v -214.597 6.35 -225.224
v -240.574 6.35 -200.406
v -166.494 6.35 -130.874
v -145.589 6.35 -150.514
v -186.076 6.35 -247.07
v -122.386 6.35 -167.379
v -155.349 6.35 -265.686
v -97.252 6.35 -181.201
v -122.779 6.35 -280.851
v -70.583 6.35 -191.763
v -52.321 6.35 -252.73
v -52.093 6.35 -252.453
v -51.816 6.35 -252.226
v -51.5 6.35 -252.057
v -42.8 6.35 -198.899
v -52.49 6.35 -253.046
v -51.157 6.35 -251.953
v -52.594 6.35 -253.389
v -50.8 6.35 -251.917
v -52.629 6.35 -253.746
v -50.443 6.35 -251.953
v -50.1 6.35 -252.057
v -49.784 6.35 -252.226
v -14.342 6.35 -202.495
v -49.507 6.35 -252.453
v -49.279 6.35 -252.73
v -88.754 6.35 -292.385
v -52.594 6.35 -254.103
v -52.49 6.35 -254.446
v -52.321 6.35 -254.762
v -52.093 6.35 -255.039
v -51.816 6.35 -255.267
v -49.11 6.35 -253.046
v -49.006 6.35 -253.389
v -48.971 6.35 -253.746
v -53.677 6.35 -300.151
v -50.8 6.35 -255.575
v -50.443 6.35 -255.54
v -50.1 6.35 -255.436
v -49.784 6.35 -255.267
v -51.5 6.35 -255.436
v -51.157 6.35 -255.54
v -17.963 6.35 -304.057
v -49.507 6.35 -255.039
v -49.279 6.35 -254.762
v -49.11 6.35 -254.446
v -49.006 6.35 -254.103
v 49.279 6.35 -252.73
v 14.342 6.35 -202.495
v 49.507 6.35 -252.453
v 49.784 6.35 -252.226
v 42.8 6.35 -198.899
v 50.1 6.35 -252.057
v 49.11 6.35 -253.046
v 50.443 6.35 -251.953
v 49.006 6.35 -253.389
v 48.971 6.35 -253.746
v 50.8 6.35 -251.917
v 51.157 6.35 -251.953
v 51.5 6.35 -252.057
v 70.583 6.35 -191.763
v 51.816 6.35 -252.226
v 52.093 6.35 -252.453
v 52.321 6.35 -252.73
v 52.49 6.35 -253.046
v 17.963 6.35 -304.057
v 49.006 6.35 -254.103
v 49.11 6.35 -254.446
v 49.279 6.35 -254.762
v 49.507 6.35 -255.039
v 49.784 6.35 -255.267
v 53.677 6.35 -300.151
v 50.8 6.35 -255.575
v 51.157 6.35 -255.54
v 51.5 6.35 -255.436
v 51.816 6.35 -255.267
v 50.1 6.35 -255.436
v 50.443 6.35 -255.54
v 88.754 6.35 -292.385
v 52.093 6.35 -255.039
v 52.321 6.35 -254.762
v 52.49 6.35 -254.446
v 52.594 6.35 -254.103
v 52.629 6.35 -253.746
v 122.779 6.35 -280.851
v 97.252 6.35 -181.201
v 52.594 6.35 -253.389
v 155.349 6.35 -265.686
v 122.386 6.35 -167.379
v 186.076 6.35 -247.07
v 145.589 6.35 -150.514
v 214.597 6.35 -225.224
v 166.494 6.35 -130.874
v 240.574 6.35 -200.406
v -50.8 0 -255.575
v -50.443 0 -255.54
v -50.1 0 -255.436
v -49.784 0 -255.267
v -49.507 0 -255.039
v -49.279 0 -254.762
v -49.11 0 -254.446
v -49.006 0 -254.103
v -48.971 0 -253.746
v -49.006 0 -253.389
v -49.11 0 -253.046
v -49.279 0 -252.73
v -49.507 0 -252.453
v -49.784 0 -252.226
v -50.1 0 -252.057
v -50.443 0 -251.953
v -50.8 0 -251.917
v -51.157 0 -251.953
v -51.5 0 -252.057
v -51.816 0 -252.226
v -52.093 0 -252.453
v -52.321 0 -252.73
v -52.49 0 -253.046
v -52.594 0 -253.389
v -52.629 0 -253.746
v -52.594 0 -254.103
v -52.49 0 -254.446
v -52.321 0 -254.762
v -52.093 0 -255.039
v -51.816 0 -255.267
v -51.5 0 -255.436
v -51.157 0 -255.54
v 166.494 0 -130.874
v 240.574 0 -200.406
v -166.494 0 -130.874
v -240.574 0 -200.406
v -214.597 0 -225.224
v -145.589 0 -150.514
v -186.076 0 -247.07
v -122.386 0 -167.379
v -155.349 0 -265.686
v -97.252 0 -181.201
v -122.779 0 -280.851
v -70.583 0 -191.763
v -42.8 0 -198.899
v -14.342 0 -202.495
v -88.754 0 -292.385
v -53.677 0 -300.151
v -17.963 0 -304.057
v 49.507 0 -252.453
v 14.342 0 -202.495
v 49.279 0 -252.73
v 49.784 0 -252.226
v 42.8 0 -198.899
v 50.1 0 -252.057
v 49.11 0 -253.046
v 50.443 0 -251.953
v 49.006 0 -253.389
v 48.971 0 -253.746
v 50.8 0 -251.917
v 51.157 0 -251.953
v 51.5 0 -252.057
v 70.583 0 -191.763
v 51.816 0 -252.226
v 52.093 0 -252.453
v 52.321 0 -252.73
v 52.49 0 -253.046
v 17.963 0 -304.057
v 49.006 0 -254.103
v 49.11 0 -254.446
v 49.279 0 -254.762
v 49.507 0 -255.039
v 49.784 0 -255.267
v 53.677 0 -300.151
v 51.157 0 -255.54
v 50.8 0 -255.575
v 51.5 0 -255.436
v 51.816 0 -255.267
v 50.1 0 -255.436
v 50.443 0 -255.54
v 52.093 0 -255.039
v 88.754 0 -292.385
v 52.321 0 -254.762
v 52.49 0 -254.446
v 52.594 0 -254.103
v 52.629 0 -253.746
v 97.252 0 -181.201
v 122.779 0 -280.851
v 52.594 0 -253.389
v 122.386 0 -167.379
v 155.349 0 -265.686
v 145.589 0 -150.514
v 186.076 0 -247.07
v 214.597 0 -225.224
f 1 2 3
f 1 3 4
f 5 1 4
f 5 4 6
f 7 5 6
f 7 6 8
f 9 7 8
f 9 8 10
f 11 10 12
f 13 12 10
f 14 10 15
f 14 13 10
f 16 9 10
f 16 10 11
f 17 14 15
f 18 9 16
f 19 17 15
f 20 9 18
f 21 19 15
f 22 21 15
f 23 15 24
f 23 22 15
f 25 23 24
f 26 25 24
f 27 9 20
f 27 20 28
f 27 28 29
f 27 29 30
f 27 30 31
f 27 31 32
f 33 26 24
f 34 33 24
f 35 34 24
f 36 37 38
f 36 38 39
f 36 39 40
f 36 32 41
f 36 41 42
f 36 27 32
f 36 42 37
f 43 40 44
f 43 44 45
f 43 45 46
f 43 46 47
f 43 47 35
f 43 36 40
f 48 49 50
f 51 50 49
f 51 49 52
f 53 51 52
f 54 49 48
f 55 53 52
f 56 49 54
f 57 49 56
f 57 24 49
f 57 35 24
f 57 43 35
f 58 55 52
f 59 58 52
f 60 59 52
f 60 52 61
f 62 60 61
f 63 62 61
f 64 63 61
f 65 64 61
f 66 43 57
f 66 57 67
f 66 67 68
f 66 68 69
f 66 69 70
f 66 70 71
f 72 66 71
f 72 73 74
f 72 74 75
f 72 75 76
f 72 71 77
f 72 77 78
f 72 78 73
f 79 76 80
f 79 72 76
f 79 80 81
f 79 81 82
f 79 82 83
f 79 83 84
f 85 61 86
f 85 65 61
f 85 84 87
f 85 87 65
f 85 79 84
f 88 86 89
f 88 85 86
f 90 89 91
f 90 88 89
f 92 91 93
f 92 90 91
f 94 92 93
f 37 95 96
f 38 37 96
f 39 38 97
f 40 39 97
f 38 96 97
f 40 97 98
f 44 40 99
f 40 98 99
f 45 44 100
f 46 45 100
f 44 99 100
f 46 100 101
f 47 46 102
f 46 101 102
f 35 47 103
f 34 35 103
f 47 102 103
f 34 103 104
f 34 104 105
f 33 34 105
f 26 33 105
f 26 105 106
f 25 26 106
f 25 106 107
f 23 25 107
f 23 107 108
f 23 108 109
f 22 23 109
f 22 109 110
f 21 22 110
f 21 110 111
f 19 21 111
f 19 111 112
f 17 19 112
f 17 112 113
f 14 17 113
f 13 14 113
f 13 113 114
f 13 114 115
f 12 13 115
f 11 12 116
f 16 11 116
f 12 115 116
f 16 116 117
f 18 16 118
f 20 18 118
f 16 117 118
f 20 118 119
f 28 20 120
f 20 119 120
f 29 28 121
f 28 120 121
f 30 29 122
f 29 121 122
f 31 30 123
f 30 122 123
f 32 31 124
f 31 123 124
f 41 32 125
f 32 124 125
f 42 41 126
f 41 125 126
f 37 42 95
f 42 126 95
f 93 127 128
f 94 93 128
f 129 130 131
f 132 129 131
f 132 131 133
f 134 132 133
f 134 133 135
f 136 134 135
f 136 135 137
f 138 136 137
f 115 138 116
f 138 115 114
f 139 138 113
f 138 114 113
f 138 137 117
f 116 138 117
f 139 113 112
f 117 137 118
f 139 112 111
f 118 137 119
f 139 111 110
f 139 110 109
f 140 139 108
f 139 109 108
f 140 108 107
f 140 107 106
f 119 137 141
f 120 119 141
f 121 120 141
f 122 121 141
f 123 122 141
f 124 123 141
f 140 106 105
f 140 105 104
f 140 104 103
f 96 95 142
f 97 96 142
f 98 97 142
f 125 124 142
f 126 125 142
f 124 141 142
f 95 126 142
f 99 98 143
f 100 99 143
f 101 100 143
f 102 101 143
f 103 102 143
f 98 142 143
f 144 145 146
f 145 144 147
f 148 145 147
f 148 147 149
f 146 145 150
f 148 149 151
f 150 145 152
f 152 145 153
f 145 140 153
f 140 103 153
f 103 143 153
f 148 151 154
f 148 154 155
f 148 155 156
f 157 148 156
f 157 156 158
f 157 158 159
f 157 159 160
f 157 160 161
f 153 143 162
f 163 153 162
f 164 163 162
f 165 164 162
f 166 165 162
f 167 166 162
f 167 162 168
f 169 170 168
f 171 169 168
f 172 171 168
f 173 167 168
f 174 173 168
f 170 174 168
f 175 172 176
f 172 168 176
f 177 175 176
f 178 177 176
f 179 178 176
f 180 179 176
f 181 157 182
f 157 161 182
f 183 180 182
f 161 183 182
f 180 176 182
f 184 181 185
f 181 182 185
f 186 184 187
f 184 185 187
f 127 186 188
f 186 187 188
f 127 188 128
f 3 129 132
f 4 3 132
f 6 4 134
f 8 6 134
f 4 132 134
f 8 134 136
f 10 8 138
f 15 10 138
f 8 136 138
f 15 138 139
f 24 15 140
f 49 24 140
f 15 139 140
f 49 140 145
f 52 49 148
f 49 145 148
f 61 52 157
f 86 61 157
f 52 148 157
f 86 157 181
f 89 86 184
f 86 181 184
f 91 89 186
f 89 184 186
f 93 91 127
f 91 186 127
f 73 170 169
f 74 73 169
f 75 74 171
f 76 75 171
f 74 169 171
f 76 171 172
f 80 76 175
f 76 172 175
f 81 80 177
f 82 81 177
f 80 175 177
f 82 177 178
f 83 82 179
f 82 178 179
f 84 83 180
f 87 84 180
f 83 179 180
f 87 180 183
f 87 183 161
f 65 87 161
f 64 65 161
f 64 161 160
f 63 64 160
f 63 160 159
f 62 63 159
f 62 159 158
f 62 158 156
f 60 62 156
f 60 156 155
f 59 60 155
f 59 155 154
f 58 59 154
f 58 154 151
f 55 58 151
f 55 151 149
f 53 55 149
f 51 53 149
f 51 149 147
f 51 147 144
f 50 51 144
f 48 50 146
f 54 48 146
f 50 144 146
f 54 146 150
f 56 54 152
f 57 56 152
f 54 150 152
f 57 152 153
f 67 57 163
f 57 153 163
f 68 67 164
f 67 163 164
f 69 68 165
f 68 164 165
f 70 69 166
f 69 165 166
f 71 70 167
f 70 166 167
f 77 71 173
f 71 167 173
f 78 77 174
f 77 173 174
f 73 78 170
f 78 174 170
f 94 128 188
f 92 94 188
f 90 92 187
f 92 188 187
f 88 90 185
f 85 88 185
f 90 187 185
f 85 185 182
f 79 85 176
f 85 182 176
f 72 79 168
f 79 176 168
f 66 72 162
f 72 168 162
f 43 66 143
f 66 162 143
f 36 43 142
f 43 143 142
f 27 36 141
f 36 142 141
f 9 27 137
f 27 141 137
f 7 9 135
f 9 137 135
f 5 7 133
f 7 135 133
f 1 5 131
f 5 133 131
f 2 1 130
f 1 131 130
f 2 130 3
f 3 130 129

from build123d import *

# Parameters (mm, degrees)
BOSS_EXTRUDE1_DEPTH       = 6.35
F_6_CLEARANCE_HOLE1_D     = 3.6576
F_6_CLEARANCE_HOLE1_DEPTH = 25.4
F_6_CLEARANCE_HOLE1_TIP   = 1.0988539


with BuildPart() as part:
    # Sketch1 → Boss-Extrude1 (new body)
    with BuildSketch(Plane(origin=(0, 0, 0), x_dir=(1, 0, 0), z_dir=(0, 1, 0))):
        with BuildLine():
            Line((166.494481955, 130.873744419), (240.574340444, 200.406))
            ThreePointArc((240.574340444, 200.406), (0, 304.546), (-240.574340444, 200.406))
            Line((-240.574340444, 200.406), (-166.494481955, 130.873744419))
            ThreePointArc((-166.494481955, 130.873744419), (0, 202.946), (166.494481955, 130.873744419))
        make_face()
    extrude(amount=BOSS_EXTRUDE1_DEPTH)

    # #6 Clearance Hole1
    with Locations(Plane(origin=(-50.8, 6.35, -253.746255929), x_dir=(0, 0, 1), z_dir=(0, 1, 0))):
        with Locations((0, 0), (0, 101.6)):
            Hole(F_6_CLEARANCE_HOLE1_D / 2, depth=F_6_CLEARANCE_HOLE1_DEPTH)
            with Locations((0, 0, -(F_6_CLEARANCE_HOLE1_DEPTH + F_6_CLEARANCE_HOLE1_TIP / 2))):  # 118° drill point
                Cone(0, F_6_CLEARANCE_HOLE1_D / 2, F_6_CLEARANCE_HOLE1_TIP, mode=Mode.SUBTRACT)


solid = part.part
